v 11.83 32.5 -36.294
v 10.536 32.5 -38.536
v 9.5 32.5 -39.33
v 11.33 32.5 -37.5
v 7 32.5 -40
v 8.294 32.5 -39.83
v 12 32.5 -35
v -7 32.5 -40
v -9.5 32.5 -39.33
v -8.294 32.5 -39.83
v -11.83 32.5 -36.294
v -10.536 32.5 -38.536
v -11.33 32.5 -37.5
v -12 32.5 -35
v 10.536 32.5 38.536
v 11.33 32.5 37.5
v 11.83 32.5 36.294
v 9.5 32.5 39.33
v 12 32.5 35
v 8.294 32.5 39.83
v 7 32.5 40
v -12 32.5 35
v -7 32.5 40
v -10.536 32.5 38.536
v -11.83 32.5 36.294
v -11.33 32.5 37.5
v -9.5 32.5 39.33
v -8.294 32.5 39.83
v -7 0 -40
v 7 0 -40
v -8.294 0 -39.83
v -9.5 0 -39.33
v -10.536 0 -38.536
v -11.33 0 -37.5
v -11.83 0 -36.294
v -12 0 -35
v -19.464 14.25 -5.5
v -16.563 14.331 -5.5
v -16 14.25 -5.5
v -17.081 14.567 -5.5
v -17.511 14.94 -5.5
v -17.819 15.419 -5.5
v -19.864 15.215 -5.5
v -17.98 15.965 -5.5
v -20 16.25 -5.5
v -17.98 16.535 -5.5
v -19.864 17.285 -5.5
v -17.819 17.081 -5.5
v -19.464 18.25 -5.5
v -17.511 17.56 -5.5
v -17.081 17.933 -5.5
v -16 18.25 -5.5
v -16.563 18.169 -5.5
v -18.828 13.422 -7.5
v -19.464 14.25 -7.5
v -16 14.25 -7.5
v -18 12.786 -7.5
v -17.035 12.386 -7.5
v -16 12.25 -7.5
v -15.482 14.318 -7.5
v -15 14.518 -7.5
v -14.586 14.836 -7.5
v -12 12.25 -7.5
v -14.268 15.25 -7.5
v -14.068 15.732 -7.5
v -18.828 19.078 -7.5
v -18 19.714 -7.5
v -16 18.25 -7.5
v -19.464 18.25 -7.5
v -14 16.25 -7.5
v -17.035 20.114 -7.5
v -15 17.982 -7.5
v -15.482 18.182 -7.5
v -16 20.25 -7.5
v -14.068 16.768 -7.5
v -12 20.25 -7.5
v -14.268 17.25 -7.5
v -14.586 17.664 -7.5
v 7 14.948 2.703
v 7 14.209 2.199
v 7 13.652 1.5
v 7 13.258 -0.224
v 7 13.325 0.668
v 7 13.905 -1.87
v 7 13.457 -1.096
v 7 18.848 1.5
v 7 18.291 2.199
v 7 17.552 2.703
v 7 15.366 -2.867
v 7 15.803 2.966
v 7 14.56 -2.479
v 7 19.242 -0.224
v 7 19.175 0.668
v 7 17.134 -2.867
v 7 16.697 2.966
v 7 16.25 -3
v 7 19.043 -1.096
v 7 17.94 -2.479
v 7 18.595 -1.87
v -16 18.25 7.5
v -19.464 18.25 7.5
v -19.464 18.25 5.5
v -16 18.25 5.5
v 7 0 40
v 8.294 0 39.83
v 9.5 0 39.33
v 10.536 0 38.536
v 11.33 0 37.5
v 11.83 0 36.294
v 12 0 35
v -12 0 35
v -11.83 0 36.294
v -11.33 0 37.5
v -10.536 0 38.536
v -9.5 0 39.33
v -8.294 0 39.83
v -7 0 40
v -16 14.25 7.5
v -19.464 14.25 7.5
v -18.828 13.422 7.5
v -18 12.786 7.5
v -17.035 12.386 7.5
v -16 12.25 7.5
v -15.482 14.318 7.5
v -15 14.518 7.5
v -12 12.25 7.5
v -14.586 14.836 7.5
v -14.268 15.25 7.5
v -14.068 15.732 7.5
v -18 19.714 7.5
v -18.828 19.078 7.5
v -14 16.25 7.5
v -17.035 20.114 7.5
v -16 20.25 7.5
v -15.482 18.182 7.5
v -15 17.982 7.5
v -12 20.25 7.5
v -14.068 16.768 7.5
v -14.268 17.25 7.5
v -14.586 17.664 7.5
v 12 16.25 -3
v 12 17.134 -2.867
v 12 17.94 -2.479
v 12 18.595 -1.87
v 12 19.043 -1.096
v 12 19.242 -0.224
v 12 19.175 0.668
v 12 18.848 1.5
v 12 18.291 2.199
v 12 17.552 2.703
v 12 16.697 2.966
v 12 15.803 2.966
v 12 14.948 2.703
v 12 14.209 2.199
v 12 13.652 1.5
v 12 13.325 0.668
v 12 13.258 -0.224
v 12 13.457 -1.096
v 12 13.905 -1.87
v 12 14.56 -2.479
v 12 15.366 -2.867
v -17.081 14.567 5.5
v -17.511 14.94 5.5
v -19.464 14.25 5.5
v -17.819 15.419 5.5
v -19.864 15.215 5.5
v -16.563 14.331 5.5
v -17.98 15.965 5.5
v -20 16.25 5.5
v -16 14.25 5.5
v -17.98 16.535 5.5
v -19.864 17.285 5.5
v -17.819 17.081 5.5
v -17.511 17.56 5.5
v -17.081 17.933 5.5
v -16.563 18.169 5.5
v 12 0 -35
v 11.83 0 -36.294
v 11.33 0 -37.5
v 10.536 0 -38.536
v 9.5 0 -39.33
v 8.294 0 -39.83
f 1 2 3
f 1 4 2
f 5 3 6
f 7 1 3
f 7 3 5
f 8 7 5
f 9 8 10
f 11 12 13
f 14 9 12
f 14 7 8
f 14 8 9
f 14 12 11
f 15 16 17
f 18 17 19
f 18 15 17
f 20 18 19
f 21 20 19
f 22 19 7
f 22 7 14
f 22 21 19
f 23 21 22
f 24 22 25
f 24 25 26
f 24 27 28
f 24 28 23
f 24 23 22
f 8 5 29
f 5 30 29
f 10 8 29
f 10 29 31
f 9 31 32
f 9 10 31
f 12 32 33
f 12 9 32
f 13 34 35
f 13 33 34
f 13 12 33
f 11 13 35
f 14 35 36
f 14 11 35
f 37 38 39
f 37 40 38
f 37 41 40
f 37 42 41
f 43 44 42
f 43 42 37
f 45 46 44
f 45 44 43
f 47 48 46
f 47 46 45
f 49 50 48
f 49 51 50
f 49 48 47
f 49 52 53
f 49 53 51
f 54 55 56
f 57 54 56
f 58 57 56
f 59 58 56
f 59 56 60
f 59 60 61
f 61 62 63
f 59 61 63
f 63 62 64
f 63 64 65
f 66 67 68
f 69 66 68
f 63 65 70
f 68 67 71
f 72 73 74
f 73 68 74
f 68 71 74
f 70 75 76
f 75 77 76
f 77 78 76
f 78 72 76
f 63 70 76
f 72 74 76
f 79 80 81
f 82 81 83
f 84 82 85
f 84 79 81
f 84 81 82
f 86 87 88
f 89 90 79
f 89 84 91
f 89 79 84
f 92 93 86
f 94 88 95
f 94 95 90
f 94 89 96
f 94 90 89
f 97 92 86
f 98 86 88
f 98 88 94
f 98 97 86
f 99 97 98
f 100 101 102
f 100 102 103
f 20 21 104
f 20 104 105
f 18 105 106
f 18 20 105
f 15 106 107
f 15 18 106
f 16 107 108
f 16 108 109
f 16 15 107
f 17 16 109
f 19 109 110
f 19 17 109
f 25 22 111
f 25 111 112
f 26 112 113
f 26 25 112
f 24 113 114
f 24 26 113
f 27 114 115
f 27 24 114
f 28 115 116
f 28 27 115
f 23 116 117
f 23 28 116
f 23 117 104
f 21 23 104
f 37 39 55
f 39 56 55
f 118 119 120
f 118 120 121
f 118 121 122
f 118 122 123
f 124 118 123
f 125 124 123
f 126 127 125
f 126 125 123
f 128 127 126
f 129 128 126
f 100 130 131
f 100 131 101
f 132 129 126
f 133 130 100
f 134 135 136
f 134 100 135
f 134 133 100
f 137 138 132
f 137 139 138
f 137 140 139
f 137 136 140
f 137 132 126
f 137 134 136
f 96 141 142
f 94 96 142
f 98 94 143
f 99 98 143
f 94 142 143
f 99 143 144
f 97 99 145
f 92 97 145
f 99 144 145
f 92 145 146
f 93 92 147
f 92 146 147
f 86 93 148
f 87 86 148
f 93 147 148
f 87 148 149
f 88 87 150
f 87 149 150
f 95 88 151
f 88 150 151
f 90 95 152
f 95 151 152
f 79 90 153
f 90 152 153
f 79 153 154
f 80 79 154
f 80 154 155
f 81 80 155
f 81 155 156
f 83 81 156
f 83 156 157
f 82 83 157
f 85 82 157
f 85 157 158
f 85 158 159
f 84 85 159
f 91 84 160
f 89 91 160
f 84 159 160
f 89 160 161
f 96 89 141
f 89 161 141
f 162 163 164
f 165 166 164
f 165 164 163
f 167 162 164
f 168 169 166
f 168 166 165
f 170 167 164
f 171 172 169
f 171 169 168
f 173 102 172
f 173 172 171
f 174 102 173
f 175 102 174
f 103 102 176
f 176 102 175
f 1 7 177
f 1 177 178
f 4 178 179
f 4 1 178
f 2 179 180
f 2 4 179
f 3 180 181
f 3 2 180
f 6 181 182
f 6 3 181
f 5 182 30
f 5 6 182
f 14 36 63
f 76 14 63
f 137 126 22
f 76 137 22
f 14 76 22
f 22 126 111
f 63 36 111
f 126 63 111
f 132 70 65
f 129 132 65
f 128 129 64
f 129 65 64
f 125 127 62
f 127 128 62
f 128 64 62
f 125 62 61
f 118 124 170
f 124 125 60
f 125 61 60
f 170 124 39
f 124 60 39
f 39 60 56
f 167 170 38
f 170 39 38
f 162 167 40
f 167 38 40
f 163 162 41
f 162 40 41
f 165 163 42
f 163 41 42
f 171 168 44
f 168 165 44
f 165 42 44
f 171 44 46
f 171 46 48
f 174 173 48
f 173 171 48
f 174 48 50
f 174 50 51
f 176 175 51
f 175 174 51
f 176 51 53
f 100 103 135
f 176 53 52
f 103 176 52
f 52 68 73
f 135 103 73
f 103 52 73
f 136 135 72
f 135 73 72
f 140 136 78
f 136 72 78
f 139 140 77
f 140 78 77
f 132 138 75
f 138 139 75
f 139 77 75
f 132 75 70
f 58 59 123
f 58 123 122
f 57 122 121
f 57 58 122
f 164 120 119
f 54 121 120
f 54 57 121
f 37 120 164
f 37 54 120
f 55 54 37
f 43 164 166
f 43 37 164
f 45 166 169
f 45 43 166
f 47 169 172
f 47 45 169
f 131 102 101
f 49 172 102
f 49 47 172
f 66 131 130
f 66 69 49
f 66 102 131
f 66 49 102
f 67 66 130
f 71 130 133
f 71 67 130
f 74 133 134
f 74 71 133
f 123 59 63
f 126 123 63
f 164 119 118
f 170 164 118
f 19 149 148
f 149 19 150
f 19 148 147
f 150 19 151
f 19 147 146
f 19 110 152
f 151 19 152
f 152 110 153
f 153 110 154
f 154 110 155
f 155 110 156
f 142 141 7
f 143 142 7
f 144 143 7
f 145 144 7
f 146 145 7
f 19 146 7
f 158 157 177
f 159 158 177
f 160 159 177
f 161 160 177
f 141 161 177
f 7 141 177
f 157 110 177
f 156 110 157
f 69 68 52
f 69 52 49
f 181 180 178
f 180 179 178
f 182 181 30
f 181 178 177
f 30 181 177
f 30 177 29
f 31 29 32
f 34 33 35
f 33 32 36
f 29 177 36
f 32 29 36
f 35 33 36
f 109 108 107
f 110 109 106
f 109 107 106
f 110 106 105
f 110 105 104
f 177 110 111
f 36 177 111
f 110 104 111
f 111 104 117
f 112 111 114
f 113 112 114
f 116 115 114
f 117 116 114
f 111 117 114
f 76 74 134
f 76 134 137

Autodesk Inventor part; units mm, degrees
ref_plane "YZ Plane" through (0, 0, 0) normal (1, 0, 0) x (0, 1, 0)
ref_plane "XZ Plane" through (0, 0, 0) normal (0, 1, 0) x (-1, 0, 0)
sketch "Sketch1" plane through (0, 0, 0) normal (0, 1, 0) x (-1, 0, 0)
  line L0 (12, 40) -> (-12, 40)
  line L1 (-12, 40) -> (-12, -40)
  line L2 (-12, -40) -> (12, -40)
  line L3 (12, -40) -> (12, 40)
  line L4 (12, 40) -> (-12, -40) construction
  line L5 (-12, 40) -> (12, -40) construction
  point P0 (0, 0)
  dimension "d0" = 24
  dimension "d1" = 80
extrude "Extrusion1" add sketch "Sketch1" along normal blind 32.5
sketch "Sketch2" plane through (12, 0, 40) normal (1, 0, 0) x (0, 0, -1)
  circle A0 centre (40, 16.25) radius 3
  line L0 (0, 0) -> (0, 32.5) projected
  line L1 (0, 32.5) -> (80, 32.5) projected
  point P0 (40, 0)
  point P1 (40, 32.5)
  dimension "d4" = 6
  dimension "d5" = 40
  dimension "d6" = 16.25
extrude "Extrusion2" cut sketch "Sketch2" against normal blind 5
ref_plane "Work Plane1" through (-12, 0, 0) normal (0, 0, 1) x (1, 0, 0)
sketch "Sketch5" plane through (-12, 0, 0) normal (0, 0, 1) x (1, 0, 0)
  circle A0 centre (-4, 16.25) radius 2
  line L0 (0, 0) -> (0, 32.5) projected
  line L1 (24, 32.5) -> (0, 32.5) projected
  arc A1 (-4, 20.25) -> (-4, 12.25) centre (-4, 16.25) ccw
  line L2 (-4, 12.25) -> (0, 12.25)
  line L3 (-4, 20.25) -> (0, 20.25)
  point P0 (12, 0)
  dimension "d9" = 4
  dimension "d10" = 4
  dimension "d11" = 16.25
  dimension "d12" = 4
extrude "Extrusion3" add sketch "Sketch5" along normal blind 7.5 and the other way blind 7.5
sketch "Sketch7" plane through (-12, 0, -7.5) normal (0, 0, -1) x (-1, 0, 0)
  line L0 (0, 12.25) -> (4, 12.25) projected
  arc A0 (4, 12.25) -> (4, 20.25) centre (4, 16.25) ccw projected
  line L1 (4, 20.25) -> (0, 20.25) projected
  line L2 (0, 12.25) -> (0, 20.25) projected
  circle A1 centre (4, 16.25) radius 2 projected
  line L3 (4, 14.25) -> (7.4641, 14.25)
  line L4 (4, 18.25) -> (7.4641, 18.25)
  point P0 (-12, 0)
extrude "Extrusion4" cut sketch "Sketch7" against normal blind 2 contours L3 A1 L4 A0
mirror "Mirror1" about plane through (-12, 0, 0) normal (0, 0, 1) of "Extrusion4"
fillet "Fillet2" radius 5 4 edges at (-12, 16.25, 40) (-12, 16.25, -40) (12, 16.25, -40) (12, 16.25, 40)
properties part number "Camera"
